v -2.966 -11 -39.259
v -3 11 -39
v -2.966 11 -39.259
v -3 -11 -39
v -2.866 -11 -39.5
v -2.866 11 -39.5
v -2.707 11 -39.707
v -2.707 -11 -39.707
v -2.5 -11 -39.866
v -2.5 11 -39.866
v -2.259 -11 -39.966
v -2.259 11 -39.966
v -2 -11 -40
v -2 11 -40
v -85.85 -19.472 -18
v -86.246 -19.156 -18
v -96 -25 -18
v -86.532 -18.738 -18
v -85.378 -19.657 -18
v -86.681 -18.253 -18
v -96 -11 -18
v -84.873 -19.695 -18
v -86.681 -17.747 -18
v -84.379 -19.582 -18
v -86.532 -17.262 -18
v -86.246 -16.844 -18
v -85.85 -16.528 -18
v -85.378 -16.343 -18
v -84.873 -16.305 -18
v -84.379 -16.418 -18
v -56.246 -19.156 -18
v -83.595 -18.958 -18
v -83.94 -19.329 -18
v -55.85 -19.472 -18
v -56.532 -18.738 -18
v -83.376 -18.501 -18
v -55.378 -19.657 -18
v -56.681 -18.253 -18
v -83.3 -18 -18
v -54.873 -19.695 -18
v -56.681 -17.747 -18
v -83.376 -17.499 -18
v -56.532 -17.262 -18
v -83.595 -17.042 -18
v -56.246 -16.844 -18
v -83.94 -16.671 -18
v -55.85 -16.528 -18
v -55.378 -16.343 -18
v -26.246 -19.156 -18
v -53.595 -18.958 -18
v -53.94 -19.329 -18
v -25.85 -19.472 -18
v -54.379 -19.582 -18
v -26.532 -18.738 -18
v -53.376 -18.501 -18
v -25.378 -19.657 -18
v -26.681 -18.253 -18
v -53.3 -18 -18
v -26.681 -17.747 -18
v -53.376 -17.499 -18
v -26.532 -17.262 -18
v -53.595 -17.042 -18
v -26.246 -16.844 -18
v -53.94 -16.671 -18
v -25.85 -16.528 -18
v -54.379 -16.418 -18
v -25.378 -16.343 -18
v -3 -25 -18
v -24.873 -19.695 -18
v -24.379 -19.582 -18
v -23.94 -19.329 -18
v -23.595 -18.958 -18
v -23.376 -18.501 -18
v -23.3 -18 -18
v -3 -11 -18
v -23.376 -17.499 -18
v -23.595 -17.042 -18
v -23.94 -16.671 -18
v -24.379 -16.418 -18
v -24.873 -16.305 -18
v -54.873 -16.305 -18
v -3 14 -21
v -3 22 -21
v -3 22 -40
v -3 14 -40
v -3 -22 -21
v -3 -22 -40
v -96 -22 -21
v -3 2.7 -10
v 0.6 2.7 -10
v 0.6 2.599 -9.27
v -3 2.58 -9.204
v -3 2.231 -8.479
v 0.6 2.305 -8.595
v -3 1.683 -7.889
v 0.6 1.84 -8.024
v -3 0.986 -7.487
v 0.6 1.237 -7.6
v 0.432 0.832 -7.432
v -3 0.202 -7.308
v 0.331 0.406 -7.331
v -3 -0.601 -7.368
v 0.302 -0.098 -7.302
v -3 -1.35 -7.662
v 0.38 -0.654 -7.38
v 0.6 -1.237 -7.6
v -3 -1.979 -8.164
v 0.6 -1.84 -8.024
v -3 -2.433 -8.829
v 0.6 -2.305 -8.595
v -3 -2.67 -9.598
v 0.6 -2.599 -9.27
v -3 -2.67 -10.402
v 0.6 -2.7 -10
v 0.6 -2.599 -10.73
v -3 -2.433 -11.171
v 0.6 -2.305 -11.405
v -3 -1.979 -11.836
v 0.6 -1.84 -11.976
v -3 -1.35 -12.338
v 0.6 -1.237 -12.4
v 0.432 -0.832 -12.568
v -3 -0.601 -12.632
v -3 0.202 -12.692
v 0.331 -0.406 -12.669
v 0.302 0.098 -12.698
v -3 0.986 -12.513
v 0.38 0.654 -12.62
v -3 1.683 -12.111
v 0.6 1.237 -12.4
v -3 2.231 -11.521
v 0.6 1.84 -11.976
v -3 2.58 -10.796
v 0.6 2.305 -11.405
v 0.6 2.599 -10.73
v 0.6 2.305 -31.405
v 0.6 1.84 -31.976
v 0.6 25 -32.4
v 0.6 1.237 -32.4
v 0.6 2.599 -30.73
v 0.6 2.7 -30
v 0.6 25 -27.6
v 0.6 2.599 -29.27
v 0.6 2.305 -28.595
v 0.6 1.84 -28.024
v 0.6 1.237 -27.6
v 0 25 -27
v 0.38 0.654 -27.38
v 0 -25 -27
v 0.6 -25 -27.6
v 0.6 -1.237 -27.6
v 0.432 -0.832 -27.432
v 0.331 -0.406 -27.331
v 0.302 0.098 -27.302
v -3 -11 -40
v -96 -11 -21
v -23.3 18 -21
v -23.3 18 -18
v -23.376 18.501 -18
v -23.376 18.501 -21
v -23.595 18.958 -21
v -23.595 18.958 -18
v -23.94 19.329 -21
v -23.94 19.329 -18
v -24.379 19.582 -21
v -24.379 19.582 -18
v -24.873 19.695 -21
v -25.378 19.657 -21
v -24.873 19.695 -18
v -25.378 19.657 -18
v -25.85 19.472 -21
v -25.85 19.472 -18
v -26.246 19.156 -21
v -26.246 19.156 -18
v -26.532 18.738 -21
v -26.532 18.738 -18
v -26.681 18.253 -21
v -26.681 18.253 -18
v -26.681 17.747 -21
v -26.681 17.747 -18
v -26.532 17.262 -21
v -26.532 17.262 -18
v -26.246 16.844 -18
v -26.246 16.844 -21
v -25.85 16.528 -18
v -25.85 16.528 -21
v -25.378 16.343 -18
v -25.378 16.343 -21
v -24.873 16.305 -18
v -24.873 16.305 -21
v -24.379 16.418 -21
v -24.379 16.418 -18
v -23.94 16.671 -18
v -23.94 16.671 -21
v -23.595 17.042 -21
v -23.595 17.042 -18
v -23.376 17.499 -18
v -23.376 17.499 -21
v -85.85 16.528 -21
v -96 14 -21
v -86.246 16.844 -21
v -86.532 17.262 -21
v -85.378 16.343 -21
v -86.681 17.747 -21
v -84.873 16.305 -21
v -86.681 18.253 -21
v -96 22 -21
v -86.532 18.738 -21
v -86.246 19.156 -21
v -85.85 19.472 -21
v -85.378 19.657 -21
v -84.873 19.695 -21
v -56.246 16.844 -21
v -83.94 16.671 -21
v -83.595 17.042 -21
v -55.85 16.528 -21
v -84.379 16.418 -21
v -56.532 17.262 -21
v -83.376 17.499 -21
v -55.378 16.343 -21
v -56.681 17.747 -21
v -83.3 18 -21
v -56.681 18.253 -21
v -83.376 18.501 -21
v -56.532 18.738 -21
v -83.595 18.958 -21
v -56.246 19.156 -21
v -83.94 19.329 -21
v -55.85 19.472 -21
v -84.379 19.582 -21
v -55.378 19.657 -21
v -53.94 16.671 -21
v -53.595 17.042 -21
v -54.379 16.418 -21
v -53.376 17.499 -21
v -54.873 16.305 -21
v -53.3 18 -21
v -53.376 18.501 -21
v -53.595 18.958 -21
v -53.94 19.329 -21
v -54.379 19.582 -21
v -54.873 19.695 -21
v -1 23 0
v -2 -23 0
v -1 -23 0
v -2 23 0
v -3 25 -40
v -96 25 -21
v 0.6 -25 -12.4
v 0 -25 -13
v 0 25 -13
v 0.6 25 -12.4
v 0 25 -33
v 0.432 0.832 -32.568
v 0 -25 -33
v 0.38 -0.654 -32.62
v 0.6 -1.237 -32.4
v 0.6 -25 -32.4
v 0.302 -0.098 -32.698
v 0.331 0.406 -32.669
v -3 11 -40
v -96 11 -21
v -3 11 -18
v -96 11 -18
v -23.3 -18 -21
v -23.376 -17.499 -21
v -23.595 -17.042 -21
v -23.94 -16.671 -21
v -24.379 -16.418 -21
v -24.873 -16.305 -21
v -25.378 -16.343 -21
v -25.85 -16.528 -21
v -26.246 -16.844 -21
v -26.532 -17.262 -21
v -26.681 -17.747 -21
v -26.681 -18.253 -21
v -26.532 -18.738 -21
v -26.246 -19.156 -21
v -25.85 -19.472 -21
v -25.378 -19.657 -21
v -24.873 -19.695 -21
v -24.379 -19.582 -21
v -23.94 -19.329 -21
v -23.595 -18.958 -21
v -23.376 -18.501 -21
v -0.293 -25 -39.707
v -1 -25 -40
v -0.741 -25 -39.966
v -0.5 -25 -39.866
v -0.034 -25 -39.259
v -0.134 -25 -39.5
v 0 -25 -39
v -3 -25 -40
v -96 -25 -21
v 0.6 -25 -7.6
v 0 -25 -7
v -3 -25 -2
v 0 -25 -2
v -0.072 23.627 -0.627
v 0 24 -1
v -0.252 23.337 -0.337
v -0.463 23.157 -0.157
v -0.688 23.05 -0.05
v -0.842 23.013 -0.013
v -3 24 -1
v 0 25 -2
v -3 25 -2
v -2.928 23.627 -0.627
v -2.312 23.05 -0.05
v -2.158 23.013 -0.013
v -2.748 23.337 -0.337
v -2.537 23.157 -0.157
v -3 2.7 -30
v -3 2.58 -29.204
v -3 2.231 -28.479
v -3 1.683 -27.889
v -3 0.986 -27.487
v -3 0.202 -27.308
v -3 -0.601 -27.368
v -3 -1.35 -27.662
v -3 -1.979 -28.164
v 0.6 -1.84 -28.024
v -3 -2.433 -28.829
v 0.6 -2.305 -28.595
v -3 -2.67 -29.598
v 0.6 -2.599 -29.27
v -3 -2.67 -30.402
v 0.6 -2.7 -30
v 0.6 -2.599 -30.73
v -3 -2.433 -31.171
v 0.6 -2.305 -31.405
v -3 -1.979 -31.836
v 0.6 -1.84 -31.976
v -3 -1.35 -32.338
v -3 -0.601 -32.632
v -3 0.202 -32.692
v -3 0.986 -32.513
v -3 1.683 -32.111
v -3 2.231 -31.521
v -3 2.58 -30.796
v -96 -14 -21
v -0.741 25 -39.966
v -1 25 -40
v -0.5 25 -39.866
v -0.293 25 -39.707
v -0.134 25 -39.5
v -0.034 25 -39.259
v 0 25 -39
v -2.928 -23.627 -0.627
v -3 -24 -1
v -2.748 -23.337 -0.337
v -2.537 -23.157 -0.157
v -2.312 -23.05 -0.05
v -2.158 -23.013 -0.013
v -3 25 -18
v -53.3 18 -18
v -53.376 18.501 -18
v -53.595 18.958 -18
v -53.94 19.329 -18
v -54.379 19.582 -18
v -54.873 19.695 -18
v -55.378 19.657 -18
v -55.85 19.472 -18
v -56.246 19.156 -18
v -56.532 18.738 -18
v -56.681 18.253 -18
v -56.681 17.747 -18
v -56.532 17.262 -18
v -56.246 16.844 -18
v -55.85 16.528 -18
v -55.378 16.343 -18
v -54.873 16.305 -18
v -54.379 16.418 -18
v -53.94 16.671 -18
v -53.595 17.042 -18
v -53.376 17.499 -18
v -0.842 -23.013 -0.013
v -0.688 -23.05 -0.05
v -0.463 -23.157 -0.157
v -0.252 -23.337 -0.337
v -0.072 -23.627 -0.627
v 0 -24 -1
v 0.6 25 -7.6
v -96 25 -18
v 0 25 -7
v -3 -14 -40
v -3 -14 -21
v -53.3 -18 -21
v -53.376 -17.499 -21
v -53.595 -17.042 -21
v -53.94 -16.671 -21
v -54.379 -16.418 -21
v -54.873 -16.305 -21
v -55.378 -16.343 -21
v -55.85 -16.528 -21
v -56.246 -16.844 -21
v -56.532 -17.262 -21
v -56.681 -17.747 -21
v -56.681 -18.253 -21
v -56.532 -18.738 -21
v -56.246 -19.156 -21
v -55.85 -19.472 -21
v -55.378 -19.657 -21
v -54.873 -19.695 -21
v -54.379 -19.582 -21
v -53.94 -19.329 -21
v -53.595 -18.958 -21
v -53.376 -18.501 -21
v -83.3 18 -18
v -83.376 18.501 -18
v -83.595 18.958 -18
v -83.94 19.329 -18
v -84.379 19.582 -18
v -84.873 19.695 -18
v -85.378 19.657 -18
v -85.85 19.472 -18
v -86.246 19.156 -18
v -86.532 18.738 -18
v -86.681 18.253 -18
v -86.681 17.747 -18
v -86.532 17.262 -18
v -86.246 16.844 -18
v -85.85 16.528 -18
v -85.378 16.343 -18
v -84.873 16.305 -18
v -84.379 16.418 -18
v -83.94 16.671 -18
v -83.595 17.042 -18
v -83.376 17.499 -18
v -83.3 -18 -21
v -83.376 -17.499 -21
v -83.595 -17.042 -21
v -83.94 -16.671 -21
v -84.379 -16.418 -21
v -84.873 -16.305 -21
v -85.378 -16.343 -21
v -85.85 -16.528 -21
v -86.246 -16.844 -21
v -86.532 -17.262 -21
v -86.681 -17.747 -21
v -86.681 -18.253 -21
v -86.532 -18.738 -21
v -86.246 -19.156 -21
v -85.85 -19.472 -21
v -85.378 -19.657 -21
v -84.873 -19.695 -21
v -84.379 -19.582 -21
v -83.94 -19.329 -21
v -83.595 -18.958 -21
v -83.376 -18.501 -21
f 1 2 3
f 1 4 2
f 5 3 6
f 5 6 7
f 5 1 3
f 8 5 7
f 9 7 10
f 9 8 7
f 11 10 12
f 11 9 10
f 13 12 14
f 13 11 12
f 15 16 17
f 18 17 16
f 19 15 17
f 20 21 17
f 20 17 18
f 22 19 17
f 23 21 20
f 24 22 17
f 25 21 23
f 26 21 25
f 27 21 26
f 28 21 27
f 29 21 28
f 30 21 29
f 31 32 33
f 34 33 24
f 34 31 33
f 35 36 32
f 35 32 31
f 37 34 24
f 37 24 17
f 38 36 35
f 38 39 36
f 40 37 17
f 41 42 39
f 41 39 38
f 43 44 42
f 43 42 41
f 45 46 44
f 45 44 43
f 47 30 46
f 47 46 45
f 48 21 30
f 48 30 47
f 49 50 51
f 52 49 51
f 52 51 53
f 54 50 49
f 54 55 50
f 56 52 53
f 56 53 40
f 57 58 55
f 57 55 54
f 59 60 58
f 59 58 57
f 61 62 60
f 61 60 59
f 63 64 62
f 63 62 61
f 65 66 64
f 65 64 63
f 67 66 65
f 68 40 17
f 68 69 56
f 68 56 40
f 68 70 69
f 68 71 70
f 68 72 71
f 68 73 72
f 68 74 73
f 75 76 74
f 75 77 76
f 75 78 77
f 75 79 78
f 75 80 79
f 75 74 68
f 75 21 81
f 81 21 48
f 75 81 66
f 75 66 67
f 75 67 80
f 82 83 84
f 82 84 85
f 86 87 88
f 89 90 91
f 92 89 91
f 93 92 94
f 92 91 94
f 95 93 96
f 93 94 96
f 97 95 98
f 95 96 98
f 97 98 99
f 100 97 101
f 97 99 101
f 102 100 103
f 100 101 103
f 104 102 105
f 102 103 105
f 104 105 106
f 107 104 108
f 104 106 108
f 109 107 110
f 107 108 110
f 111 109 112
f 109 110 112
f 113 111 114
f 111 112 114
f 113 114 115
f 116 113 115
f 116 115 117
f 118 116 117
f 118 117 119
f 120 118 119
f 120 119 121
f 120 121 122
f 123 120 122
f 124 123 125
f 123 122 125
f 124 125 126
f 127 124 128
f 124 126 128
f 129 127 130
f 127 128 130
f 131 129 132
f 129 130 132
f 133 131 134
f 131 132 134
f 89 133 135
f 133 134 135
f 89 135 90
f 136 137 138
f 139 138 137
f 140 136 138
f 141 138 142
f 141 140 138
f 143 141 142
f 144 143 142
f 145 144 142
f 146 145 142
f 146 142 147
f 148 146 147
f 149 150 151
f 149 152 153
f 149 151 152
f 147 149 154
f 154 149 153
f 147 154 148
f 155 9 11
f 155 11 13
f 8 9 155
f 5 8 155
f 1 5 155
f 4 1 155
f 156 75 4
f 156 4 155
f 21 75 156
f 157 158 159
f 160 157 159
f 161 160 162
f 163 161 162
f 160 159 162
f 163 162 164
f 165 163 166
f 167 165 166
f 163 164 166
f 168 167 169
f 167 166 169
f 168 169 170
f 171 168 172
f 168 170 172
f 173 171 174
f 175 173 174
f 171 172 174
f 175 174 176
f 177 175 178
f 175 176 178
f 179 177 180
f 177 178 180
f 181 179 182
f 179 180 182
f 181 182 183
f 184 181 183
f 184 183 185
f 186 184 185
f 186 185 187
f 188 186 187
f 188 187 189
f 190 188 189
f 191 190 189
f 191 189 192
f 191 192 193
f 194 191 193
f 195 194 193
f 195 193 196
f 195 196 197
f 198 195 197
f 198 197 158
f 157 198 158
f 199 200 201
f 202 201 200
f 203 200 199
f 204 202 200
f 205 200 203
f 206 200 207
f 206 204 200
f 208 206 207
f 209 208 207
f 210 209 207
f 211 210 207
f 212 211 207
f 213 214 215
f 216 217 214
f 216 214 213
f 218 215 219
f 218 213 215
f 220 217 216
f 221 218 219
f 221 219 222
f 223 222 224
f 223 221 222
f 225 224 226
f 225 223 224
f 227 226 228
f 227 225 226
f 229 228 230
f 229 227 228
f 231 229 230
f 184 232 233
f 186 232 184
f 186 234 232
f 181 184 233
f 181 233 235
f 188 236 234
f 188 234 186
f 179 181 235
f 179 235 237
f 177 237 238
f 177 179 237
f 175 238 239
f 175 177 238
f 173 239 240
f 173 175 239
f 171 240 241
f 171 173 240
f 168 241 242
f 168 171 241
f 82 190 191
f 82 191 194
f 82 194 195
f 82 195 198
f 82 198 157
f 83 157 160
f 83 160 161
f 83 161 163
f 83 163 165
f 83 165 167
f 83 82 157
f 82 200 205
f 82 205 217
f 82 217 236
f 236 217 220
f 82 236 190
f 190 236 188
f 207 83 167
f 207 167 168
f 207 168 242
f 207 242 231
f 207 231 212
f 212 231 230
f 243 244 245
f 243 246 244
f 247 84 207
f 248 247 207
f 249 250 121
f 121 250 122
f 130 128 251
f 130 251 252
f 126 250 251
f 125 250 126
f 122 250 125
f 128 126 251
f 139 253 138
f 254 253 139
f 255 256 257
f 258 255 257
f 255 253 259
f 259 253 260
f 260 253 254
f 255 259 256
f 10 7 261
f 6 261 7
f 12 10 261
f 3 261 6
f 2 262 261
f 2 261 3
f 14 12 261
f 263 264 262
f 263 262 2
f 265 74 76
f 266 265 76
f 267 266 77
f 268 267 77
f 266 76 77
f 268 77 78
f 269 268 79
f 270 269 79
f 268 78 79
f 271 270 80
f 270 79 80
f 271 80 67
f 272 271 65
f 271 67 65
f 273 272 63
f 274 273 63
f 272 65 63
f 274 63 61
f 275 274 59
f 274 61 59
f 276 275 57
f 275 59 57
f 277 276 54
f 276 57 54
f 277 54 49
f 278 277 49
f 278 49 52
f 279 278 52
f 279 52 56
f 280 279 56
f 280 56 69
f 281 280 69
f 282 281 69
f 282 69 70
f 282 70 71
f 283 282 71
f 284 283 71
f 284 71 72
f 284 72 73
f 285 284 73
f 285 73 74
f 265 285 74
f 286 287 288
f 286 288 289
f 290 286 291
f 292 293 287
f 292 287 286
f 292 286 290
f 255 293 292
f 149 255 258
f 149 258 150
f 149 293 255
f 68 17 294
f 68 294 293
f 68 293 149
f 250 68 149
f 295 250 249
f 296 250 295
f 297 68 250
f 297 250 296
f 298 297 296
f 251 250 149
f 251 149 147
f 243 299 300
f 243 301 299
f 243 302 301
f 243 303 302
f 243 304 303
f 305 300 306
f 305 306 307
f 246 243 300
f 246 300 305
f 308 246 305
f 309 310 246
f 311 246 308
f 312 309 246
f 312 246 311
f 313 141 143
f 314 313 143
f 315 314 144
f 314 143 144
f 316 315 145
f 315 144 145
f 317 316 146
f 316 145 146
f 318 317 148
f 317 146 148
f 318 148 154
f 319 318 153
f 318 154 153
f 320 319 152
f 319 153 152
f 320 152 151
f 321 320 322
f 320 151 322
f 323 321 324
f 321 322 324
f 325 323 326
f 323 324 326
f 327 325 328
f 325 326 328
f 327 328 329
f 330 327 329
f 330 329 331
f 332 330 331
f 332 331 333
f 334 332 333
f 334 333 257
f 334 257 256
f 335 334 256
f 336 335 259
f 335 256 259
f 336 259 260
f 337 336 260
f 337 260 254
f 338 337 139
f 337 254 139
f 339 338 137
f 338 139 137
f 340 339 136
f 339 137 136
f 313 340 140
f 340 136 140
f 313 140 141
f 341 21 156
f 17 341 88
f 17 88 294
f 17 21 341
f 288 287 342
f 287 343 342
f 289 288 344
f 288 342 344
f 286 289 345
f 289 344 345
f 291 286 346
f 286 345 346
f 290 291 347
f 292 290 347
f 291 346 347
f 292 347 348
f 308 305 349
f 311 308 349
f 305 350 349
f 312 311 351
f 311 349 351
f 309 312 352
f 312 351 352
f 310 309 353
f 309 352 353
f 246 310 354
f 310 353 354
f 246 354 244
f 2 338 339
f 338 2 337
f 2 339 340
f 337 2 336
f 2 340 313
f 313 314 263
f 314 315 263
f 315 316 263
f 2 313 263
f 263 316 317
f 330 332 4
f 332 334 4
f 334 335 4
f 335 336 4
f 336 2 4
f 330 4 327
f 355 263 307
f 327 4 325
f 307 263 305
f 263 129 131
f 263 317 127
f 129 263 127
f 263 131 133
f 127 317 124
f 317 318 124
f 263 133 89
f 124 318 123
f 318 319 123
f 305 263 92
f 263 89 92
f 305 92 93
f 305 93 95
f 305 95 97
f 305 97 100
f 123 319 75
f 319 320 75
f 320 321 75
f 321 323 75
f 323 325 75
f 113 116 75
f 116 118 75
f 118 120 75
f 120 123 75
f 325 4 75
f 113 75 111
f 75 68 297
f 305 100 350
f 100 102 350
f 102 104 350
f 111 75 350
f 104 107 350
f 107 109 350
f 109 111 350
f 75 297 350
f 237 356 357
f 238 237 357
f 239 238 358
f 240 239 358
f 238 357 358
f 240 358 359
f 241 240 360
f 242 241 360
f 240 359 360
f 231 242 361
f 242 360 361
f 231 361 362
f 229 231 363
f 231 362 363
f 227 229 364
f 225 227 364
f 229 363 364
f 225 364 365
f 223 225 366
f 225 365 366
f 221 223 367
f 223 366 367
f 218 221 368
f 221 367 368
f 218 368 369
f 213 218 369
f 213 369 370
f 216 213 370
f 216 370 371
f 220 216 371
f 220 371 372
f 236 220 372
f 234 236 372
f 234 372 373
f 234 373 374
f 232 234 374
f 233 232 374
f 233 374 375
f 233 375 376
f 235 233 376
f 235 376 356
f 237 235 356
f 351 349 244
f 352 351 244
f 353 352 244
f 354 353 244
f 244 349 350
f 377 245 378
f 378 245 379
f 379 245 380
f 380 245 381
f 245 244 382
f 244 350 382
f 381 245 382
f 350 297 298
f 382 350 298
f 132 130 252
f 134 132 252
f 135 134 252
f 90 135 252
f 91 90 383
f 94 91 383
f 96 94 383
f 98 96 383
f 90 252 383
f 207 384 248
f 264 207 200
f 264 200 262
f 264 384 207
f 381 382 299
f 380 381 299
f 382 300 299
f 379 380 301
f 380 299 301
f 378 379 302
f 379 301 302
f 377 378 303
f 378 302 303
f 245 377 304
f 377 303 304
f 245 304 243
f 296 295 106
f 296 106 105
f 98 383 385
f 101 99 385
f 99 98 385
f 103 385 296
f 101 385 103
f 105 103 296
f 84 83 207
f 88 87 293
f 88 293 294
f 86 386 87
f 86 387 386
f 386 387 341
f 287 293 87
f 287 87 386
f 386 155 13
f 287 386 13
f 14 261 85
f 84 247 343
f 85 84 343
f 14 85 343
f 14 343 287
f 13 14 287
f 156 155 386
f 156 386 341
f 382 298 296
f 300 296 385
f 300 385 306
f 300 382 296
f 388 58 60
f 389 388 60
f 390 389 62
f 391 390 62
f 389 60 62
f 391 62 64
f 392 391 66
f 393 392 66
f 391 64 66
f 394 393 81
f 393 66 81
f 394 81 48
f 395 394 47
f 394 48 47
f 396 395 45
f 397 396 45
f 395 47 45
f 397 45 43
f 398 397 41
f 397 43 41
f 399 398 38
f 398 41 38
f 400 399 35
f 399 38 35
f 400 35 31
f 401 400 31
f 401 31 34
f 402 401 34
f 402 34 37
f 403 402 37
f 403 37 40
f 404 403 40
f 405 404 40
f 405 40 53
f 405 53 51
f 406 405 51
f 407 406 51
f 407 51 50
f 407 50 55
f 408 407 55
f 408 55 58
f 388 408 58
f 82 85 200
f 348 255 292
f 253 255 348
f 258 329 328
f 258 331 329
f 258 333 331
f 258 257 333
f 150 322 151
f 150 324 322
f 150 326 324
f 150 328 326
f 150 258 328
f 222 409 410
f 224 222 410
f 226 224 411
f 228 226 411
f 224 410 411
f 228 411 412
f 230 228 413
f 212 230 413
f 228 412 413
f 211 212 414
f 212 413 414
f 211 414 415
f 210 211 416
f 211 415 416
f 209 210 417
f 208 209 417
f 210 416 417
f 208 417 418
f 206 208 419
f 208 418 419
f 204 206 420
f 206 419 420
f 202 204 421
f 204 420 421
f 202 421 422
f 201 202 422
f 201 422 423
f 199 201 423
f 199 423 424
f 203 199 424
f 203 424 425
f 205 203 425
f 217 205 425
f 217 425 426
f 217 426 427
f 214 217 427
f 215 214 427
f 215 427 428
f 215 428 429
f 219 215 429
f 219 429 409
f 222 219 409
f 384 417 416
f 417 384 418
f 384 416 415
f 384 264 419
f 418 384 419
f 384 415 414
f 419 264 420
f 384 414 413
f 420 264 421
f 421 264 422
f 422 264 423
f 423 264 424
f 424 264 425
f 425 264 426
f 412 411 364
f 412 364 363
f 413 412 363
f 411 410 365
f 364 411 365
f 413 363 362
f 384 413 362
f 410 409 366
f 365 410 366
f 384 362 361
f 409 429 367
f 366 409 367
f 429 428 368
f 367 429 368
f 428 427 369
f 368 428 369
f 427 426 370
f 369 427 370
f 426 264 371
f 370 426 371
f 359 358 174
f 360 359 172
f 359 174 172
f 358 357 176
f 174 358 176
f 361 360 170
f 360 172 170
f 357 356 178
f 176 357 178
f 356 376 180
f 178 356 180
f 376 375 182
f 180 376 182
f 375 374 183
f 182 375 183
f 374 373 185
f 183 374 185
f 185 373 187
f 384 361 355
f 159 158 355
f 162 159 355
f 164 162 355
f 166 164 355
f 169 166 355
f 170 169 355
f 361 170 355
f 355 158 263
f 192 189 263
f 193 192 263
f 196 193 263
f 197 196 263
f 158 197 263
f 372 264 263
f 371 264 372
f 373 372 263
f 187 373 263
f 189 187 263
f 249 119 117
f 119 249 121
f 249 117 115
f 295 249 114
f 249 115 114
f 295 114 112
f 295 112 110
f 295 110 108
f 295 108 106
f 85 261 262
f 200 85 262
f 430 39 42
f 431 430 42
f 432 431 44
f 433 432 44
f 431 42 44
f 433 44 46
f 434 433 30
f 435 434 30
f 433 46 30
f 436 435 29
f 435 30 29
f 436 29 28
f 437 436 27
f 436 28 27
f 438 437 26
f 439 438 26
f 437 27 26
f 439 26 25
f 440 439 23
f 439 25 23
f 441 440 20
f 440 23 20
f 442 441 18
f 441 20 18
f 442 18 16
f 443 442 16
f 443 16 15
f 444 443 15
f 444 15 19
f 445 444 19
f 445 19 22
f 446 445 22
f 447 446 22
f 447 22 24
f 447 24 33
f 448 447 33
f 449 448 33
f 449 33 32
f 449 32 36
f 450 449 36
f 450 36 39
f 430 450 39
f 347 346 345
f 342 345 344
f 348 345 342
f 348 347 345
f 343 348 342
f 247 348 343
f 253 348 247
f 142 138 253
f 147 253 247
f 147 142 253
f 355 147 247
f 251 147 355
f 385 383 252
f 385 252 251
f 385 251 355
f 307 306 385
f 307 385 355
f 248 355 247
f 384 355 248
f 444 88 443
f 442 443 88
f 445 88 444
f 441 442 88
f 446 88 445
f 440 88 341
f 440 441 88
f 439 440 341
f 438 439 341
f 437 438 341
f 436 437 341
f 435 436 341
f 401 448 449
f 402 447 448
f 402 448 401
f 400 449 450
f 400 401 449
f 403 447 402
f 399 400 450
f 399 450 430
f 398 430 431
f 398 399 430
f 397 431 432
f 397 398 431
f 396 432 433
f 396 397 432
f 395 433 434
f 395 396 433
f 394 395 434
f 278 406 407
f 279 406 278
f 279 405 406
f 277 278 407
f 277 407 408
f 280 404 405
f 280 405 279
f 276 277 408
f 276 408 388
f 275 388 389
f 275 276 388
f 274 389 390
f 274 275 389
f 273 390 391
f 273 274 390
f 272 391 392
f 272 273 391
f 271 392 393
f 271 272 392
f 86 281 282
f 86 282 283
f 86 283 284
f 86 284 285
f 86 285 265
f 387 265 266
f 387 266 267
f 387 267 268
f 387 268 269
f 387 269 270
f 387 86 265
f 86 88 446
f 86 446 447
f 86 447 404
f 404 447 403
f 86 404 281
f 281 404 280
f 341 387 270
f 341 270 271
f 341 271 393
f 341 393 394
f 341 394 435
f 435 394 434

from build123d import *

# Parameters (mm, degrees)
PAD_DEPTH         = 40
PAD001_DEPTH      = 25
POCKET_DEPTH      = 25.001
POCKET_DEPTH_BACK = -25.001
POCKET001_DEPTH   = 93
SKETCH003_R       = 1.7
POCKET002_DEPTH   = 40.001
SKETCH005_R       = 2.7
POCKET003_DEPTH   = 96.601
CHAMFER_SIZE      = 2
FILLET_R          = 1


with BuildPart() as part:
    # Sketch → Pad (new body)
    with BuildSketch(Plane.XY):
        Polygon((0, 25), (-96, 25), (-96, 11), (-3, 11), (-3, -11), (-96, -11), (-96, -25), (0, -25), align=None)
    extrude(amount=-PAD_DEPTH)

    # Sketch004 → Pad001 (join, symmetric)
    with BuildSketch(Plane.XZ):
        Polygon((0, -7), (0, -13), (0.6, -12.4), (0.6, -7.6), align=None)
        Polygon((0, -27), (0, -33), (0.6, -32.4), (0.6, -27.6), align=None)
    extrude(amount=PAD001_DEPTH, both=True)

    # Sketch001 → Pocket (cut, two sides)
    with BuildSketch(Plane.XZ) as pocket_sk:
        Polygon((-3, -40), (-96, -21), (-96, -18), (-3, -18), (-3, 0), (-97, 0), (-97, -40), align=None)
    extrude(amount=-POCKET_DEPTH, mode=Mode.SUBTRACT)
    extrude(pocket_sk.sketch, amount=-POCKET_DEPTH_BACK, mode=Mode.SUBTRACT)

    # Sketch002 → Pocket001 (cut)
    with BuildSketch(Plane.YZ.offset(-3)):
        Polygon((-22, -41), (-22, -21), (-14, -21), (-14, -40), (14, -40), (14, -21), (22, -21), (22, -41), align=None)
    extrude(amount=-POCKET001_DEPTH, mode=Mode.SUBTRACT)

    # Sketch003 → Pocket002 (cut, through all)
    with BuildSketch(Plane.XY):
        with Locations((-85, 18)):
            Circle(SKETCH003_R)
        with Locations((-25, 18)):
            Circle(SKETCH003_R)
        with Locations((-25, -18)):
            Circle(SKETCH003_R)
        with Locations((-85, -18)):
            Circle(SKETCH003_R)
        with Locations((-55, -18)):
            Circle(SKETCH003_R)
        with Locations((-55, 18)):
            Circle(SKETCH003_R)
    extrude(amount=-POCKET002_DEPTH, mode=Mode.SUBTRACT)

    # Sketch005 → Pocket003 (cut, through all)
    with BuildSketch(Plane.YZ.offset(0.6)):
        with Locations((0, -10)):
            Circle(SKETCH005_R)
        with Locations((0, -30)):
            Circle(SKETCH005_R)
    extrude(amount=-POCKET003_DEPTH, mode=Mode.SUBTRACT)

    # Chamfer
    chamfer_edges = [part.edges().sort_by_distance(p)[0] for p in [
        (-1.5, 25, 0),
        (-1.5, -25, 0),
    ]]
    chamfer(chamfer_edges, length=CHAMFER_SIZE)

    # Fillet
    fillet_edges = [part.edges().sort_by_distance(p)[0] for p in [
        (0, 0, 0),
        (0, 0, -40),
        (-3, 0, 0),
        (-3, 0, -40),
    ]]
    fillet(fillet_edges, radius=FILLET_R)


solid = part.part
